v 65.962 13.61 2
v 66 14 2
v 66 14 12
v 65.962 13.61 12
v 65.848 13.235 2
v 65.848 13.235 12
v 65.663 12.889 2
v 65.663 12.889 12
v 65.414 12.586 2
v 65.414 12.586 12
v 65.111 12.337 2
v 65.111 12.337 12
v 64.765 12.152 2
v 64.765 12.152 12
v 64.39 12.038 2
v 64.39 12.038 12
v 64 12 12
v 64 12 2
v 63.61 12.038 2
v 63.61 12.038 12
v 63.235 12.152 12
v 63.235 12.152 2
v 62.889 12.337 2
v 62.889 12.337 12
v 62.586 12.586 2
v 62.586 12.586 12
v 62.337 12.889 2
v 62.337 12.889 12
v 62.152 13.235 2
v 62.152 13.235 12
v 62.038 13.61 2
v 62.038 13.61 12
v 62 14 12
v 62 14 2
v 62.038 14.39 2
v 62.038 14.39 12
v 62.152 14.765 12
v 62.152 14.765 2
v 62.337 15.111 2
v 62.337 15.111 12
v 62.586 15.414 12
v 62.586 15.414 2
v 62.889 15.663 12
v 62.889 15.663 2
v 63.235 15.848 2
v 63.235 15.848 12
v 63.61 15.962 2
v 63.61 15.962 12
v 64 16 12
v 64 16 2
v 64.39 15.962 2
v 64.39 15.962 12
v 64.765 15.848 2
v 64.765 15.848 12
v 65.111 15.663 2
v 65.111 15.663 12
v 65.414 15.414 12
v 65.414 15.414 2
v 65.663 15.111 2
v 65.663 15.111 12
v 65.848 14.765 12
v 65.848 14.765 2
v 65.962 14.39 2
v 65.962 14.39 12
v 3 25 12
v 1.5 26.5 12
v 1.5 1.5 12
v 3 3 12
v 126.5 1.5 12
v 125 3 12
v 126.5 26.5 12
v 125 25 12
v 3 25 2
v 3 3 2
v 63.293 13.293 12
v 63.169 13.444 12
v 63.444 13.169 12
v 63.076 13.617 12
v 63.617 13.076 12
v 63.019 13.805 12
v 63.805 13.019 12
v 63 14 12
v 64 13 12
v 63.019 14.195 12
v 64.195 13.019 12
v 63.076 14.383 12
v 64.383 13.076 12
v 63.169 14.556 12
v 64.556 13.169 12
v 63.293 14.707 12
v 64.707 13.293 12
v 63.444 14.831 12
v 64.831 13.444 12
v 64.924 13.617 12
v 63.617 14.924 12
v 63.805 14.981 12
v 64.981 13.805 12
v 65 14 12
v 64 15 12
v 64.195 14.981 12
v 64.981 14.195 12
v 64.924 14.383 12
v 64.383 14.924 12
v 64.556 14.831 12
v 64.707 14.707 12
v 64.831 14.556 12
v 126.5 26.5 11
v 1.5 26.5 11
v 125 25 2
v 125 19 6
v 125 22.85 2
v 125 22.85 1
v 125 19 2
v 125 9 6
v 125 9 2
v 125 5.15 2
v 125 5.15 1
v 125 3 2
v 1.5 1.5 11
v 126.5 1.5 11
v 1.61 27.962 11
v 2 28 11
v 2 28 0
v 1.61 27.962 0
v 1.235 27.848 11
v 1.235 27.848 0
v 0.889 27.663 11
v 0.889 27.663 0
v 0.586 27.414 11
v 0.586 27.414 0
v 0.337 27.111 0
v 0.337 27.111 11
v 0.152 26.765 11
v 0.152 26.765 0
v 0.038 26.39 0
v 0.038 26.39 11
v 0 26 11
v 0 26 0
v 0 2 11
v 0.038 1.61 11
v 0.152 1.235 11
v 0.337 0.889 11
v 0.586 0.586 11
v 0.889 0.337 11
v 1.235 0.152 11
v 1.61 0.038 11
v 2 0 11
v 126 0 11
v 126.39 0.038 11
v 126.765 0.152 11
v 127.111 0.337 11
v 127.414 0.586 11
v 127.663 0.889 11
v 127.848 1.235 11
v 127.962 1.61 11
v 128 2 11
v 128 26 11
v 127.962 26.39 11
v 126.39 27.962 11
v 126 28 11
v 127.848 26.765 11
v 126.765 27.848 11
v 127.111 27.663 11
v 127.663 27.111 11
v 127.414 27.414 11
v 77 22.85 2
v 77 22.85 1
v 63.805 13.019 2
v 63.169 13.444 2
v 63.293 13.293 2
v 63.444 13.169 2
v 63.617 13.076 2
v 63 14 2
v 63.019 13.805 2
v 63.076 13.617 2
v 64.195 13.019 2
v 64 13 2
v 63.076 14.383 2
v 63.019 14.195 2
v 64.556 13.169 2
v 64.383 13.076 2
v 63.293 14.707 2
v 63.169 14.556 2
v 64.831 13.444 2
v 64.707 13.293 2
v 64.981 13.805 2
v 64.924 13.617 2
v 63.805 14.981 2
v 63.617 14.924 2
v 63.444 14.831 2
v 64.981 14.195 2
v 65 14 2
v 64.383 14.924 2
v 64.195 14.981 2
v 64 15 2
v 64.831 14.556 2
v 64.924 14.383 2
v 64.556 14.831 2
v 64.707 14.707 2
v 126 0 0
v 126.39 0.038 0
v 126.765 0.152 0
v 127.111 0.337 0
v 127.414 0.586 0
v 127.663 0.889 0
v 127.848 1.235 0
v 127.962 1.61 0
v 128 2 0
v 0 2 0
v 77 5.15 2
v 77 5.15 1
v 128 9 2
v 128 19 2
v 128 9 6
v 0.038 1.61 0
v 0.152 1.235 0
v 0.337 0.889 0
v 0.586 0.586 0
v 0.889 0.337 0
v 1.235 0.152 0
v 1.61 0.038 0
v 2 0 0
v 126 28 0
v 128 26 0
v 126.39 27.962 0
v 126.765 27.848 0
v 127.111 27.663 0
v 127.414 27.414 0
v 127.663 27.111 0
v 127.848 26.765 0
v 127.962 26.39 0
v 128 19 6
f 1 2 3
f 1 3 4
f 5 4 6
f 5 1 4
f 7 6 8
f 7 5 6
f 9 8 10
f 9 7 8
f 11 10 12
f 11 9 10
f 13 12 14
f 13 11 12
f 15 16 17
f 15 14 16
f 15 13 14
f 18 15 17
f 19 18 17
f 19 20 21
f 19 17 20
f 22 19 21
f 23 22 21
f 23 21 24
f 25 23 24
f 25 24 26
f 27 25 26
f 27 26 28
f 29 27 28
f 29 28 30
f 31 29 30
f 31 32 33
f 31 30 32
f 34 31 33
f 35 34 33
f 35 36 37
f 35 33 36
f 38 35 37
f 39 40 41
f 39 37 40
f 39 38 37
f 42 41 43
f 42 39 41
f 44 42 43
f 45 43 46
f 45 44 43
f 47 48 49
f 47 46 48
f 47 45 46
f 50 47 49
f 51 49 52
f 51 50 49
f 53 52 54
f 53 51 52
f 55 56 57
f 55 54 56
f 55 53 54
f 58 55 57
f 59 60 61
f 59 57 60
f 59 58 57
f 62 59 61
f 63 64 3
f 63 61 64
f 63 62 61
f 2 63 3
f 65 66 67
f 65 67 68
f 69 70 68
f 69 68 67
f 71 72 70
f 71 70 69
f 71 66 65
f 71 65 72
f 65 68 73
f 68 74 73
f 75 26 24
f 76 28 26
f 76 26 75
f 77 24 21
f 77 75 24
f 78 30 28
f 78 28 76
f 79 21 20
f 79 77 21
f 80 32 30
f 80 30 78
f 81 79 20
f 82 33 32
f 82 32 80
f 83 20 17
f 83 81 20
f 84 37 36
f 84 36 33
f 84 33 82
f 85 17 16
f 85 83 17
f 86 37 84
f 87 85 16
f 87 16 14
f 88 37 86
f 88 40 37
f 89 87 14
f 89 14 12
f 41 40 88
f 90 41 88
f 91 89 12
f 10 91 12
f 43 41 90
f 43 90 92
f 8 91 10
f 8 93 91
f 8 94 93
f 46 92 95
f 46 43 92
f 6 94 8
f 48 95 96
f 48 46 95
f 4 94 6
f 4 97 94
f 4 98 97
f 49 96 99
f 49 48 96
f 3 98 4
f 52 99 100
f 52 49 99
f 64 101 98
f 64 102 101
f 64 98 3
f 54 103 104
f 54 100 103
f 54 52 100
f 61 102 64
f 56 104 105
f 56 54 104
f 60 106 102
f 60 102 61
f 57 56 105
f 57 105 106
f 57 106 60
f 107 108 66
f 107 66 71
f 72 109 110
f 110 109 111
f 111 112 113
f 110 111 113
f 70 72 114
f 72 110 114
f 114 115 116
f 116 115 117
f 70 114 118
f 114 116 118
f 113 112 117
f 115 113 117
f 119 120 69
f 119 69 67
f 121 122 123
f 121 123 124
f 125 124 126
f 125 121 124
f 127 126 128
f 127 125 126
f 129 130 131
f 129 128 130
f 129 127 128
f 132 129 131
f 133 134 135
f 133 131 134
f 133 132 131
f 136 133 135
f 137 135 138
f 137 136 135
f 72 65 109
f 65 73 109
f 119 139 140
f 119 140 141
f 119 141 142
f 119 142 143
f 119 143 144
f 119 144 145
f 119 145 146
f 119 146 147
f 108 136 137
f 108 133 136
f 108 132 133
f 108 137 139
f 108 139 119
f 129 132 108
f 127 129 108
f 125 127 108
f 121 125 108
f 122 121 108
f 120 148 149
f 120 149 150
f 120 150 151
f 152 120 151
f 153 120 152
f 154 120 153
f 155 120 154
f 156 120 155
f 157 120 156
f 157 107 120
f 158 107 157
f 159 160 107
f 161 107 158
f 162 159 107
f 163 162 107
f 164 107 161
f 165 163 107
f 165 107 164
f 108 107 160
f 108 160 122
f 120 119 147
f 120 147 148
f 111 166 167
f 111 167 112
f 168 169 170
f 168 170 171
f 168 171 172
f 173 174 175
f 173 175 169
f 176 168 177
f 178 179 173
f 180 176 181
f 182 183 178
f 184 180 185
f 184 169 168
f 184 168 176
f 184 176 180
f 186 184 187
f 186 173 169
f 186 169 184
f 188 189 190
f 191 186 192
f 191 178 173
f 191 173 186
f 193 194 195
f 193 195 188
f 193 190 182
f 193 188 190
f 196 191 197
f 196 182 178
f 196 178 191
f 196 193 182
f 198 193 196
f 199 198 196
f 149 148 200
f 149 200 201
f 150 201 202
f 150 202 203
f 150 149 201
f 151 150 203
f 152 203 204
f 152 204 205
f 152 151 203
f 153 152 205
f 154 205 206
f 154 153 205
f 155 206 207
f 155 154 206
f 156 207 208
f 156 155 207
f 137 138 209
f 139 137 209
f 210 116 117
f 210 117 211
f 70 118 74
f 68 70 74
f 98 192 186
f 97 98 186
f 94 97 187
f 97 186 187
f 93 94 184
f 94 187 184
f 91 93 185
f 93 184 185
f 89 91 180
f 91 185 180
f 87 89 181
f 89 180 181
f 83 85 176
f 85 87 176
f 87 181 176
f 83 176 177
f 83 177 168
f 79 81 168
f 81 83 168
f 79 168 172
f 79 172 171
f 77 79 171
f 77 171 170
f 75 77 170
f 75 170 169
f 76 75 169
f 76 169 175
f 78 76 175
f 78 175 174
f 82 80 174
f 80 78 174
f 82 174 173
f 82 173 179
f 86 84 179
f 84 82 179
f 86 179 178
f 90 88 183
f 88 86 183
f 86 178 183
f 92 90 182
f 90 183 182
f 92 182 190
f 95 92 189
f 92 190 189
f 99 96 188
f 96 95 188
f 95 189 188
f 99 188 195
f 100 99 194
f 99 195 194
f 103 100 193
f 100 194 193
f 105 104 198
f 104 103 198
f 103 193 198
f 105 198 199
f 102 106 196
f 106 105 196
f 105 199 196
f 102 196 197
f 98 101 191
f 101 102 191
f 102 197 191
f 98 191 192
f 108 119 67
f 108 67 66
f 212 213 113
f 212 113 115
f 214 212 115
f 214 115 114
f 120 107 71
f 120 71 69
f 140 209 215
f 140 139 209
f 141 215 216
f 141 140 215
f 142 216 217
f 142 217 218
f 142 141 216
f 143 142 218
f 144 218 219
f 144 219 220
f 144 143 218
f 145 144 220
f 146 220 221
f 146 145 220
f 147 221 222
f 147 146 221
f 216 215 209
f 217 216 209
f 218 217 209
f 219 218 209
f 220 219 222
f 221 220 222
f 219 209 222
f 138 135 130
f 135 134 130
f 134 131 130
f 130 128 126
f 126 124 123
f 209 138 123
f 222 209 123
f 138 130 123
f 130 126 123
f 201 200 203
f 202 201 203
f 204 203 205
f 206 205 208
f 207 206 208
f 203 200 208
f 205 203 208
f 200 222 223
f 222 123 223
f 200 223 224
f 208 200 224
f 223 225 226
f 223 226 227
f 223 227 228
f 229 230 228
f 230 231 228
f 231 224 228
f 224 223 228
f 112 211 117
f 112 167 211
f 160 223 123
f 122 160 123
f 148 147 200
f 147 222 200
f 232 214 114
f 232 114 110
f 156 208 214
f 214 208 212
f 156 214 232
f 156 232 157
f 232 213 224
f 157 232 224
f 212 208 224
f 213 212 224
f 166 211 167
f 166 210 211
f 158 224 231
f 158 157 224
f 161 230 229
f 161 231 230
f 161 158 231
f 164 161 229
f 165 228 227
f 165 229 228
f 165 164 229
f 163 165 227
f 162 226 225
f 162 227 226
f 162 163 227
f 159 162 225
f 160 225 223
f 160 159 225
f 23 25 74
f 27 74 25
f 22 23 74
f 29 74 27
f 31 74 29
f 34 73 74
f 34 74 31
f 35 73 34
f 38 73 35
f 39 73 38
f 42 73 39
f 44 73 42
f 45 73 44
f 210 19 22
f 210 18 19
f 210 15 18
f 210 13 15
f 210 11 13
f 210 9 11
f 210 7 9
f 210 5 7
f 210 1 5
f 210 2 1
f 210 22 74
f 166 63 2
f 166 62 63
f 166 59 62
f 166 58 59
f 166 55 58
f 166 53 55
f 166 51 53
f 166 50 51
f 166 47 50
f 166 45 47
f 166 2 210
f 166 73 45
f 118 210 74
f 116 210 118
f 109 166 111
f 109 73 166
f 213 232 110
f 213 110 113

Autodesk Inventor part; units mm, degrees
sketch "Sketch1" plane through (0, 0, 0) normal (0, 0, 1) x (1, 0, 0)
  line L0 (0, 0) -> (128, 0)
  line L1 (128, 0) -> (128, 28)
  line L2 (128, 28) -> (0, 28)
  line L3 (0, 28) -> (0, 0)
  dimension "d57" = 128
  dimension "d58" = 28
ref_plane "Work Plane7" through (0, 0, 12) normal (0, 0, 1) x (1, 0, 0)
sketch "Sketch2" plane through (0, 0, 12) normal (0, 0, 1) x (1, 0, 0)
  line L0 (3, 3) -> (85, 3)
  line L1 (85, 3) -> (85, 45)
  line L2 (85, 45) -> (3, 45)
  line L3 (3, 45) -> (3, 3)
  line L4 (88, 48) -> (0, 48) projected
  line L5 (88, 0) -> (88, 48) projected
  line L6 (0, 0) -> (88, 0) projected
  line L7 (0, 48) -> (0, 0) projected
  dimension "d4" = 3
  dimension "d5" = 3
  dimension "d6" = 3
  dimension "d7" = 3
ref_plane "Work Plane6" through (0, 0, 12) normal (0, 0, 1) x (1, 0, 0)
sketch "Sketch3" plane through (0, 0, 12) normal (0, 0, 1) x (1, 0, 0)
  line L0 (1.5, 46.5) -> (86.5, 46.5)
  line L1 (86.5, 46.5) -> (86.5, 1.5)
  line L2 (86.5, 1.5) -> (1.5, 1.5)
  line L3 (1.5, 1.5) -> (1.5, 46.5)
  line L4 (0, 0) -> (88, 0) projected
  line L5 (0, 48) -> (0, 0) projected
  line L6 (88, 0) -> (0, 0)
  line L7 (0, 0) -> (0, 48)
  line L8 (0, 48) -> (88, 48)
  line L9 (88, 48) -> (88, 0)
  dimension "d10" = 1.5
  dimension "d11" = 1.5
  dimension "d12" = 1.5
  dimension "d13" = 1.5
ref_plane "Work Plane5" through (0, 0, 12) normal (0, 0, 1) x (1, 0, 0)
sketch "Sketch4" plane through (0, 0, 12) normal (0, 0, 1) x (1, 0, 0)
  circle A0 centre (5.5, 24) radius 1
  circle A1 centre (82.5, 24) radius 1
  line L0 (3, 45) -> (85, 45) projected
  line L1 (3, 3) -> (3, 45) projected
  line L2 (3, 25.5) -> (5.5, 25.5)
  line L3 (5.5, 25.5) -> (5.5, 22.5)
  line L4 (5.5, 22.5) -> (3, 22.5)
  line L5 (3, 22.5) -> (3, 25.5)
  circle A2 centre (5.5, 24) radius 1.5
  line L6 (85, 45) -> (85, 3) projected
  line L7 (85, 22.5) -> (82.5, 22.5)
  line L8 (82.5, 22.5) -> (82.5, 25.5)
  line L9 (82.5, 25.5) -> (85, 25.5)
  line L10 (85, 25.5) -> (85, 22.5)
  circle A3 centre (82.5, 24) radius 1.5
  point P0 (0, 0)
  dimension "d17" = 2
  dimension "d18" = 2
  dimension "d19" = 21
  dimension "d20" = 21
  dimension "d21" = 2.5
  dimension "d22" = 3
  dimension "d23" = 1.5
  dimension "d24" = 2.5
  dimension "d25" = 2.5
  dimension "d26" = 3
  dimension "d27" = 1.5
ref_plane "Work Plane4" through (0, 0, 12) normal (0, 0, 1) x (1, 0, 0)
sketch "Sketch5" plane through (0, 0, 12) normal (0, 0, 1) x (1, 0, 0)
  circle A0 centre (5.5, 24) radius 1
  circle A1 centre (82.5, 24) radius 1
  line L0 (3, 25.5) -> (3, 22.5) projected
  line L1 (3, 22.5) -> (5.5, 22.5) projected
  line L2 (82.5, 22.5) -> (85, 22.5) projected
  line L3 (85, 22.5) -> (85, 25.5) projected
  point P0 (0, 0)
  dimension "d30" = 2
  dimension "d31" = 2
  dimension "d32" = 2.5
  dimension "d33" = 1.5
  dimension "d34" = 1.5
  dimension "d35" = 2.5
ref_plane "Work Plane1" through (0, 0, 3) normal (0, 0, 1) x (1, 0, 0)
sketch "Sketch6" plane through (0, 0, 3) normal (0, 0, 1) x (1, 0, 0)
  line L0 (35, 45) -> (53, 45)
  line L1 (53, 45) -> (53, 9)
  line L2 (53, 9) -> (35, 9)
  line L3 (35, 9) -> (35, 45)
  line L4 (3, 45) -> (85, 45) projected
  line L5 (3, 3) -> (3, 45) projected
  point P0 (0, 0)
  point P1 (3, 25.5)
  dimension "d38" = 18
  dimension "d39" = 36
  dimension "d40" = 0
  dimension "d41" = 32
  dimension "d50" = 82
ref_plane "Work Plane2" through (0, 48, 11) normal (0, 1, 0) x (1, 0, 0)
sketch "Sketch7" plane through (0, 48, 11) normal (0, 1, 0) x (1, 0, 0)
  line L0 (48.5, 4.8) -> (40.5, 4.8)
  line L1 (40.5, 4.8) -> (40.5, 8)
  line L2 (40.5, 8) -> (48.5, 8)
  line L3 (48.5, 8) -> (48.5, 4.8)
  line L4 (88, 11) -> (0, 11) projected
  line L5 (86, 11) -> (86, 0) projected
  dimension "d44" = 8
  dimension "d45" = 3.2
  dimension "d46" = 3
  dimension "d47" = 37.5
ref_plane "Work Plane3" through (0, 48, 11) normal (0, 1, 0) x (1, 0, 0)
sketch "Sketch8" plane through (0, 48, 11) normal (0, 1, 0) x (1, 0, 0)
  line L0 (50.5, 9.5) -> (38.5, 9.5)
  line L1 (38.5, 9.5) -> (38.5, 3.3)
  line L2 (38.5, 3.3) -> (50.5, 3.3)
  line L3 (50.5, 3.3) -> (50.5, 9.5)
  line L4 (48.5, 8) -> (48.5, 4.8) projected
  line L5 (40.5, 4.8) -> (40.5, 8) projected
  line L6 (48.5, 4.8) -> (40.5, 4.8) projected
  line L7 (40.5, 8) -> (48.5, 8) projected
  point P0 (0, 11)
  dimension "d51" = 2
  dimension "d52" = 2
  dimension "d53" = 1.5
  dimension "d54" = 1.5
extrude "Extrusion9" add sketch "Sketch1" along normal blind 11
sketch "Sketch9" plane through (0, 0, 11) normal (0, 0, 1) x (1, 0, 0)
  line L0 (3, 3) -> (125, 3)
  line L1 (125, 3) -> (125, 25)
  line L2 (125, 25) -> (3, 25)
  line L3 (3, 25) -> (3, 3)
  line L4 (0, 0) -> (128, 0) projected
  line L5 (0, 28) -> (0, 0) projected
  dimension "d61" = 122
  dimension "d62" = 22
  dimension "d63" = 3
  dimension "d64" = 3
extrude "Extrusion10" cut sketch "Sketch9" against normal blind 9
fillet "Fillet2" radius 2 4 edges at (128, 0, 5.5) (0, 28, 5.5) (0, 0, 5.5) (128, 28, 5.5)
sketch "Sketch10" plane through (0, 0, 11) normal (0, 0, 1) x (1, 0, 0)
  line L0 (3, 3) -> (3, 25) projected
  line L1 (125, 25) -> (125, 3) projected
  line L2 (3, 25) -> (125, 25)
  line L3 (125, 25) -> (125, 3)
  line L4 (125, 3) -> (3, 3)
  line L5 (3, 3) -> (3, 25)
  line L6 (1.5, 26.5) -> (126.5, 26.5)
  line L7 (126.5, 26.5) -> (126.5, 1.5)
  line L8 (126.5, 1.5) -> (1.5, 1.5)
  line L9 (1.5, 1.5) -> (1.5, 26.5)
  point P0 (0, 0)
  dimension "d69" = 1.5
  dimension "d70" = 1.5
  dimension "d71" = 1.5
  dimension "d72" = 1.5
extrude "Extrusion11" add sketch "Sketch10" along normal blind 1
sketch "Sketch11" plane through (0, 0, 2) normal (0, 0, 1) x (1, 0, 0)
  line L0 (125, 5.15) -> (77, 5.15)
  line L1 (77, 5.15) -> (77, 22.85)
  line L2 (77, 22.85) -> (125, 22.85)
  line L3 (125, 22.85) -> (125, 5.15)
  line L4 (125, 25) -> (125, 3) projected
  line L5 (3, 25) -> (125, 25) projected
  point P0 (0, 0)
  dimension "d75" = 48
  dimension "d76" = 17.7
  dimension "d77" = 0
  dimension "d78" = 2.15
extrude "Extrusion12" cut sketch "Sketch11" against normal blind 1
sketch "Sketch13" plane through (128, 2, 0) normal (1, 0, 0) x (0, 0, -1)
  line L0 (-2, 7) -> (-6, 7)
  line L1 (-6, 7) -> (-6, 17)
  line L2 (-6, 17) -> (-2, 17)
  line L3 (-2, 17) -> (-2, 7)
  line L4 (-11, -2) -> (0, -2) projected
  line L5 (0, 0) -> (0, 24) projected
  dimension "d81" = 4
  dimension "d82" = 10
  dimension "d83" = 9
  dimension "d84" = 2
extrude "Extrusion13" cut sketch "Sketch13" against normal blind 3
sketch "Sketch14" plane through (0, 0, 2) normal (0, 0, 1) x (1, 0, 0)
  circle A0 centre (64, 14) radius 1
  circle A1 centre (64, 14) radius 2
  line L0 (3, 25) -> (125, 25) projected
  line L1 (3, 3) -> (3, 25) projected
  point P0 (0, 0)
  dimension "d87" = 2
  dimension "d88" = 4
  dimension "d89" = 11
  dimension "d90" = 61
extrude "Extrusion14" add sketch "Sketch14" along normal blind 10
properties part number "Base Wide"
